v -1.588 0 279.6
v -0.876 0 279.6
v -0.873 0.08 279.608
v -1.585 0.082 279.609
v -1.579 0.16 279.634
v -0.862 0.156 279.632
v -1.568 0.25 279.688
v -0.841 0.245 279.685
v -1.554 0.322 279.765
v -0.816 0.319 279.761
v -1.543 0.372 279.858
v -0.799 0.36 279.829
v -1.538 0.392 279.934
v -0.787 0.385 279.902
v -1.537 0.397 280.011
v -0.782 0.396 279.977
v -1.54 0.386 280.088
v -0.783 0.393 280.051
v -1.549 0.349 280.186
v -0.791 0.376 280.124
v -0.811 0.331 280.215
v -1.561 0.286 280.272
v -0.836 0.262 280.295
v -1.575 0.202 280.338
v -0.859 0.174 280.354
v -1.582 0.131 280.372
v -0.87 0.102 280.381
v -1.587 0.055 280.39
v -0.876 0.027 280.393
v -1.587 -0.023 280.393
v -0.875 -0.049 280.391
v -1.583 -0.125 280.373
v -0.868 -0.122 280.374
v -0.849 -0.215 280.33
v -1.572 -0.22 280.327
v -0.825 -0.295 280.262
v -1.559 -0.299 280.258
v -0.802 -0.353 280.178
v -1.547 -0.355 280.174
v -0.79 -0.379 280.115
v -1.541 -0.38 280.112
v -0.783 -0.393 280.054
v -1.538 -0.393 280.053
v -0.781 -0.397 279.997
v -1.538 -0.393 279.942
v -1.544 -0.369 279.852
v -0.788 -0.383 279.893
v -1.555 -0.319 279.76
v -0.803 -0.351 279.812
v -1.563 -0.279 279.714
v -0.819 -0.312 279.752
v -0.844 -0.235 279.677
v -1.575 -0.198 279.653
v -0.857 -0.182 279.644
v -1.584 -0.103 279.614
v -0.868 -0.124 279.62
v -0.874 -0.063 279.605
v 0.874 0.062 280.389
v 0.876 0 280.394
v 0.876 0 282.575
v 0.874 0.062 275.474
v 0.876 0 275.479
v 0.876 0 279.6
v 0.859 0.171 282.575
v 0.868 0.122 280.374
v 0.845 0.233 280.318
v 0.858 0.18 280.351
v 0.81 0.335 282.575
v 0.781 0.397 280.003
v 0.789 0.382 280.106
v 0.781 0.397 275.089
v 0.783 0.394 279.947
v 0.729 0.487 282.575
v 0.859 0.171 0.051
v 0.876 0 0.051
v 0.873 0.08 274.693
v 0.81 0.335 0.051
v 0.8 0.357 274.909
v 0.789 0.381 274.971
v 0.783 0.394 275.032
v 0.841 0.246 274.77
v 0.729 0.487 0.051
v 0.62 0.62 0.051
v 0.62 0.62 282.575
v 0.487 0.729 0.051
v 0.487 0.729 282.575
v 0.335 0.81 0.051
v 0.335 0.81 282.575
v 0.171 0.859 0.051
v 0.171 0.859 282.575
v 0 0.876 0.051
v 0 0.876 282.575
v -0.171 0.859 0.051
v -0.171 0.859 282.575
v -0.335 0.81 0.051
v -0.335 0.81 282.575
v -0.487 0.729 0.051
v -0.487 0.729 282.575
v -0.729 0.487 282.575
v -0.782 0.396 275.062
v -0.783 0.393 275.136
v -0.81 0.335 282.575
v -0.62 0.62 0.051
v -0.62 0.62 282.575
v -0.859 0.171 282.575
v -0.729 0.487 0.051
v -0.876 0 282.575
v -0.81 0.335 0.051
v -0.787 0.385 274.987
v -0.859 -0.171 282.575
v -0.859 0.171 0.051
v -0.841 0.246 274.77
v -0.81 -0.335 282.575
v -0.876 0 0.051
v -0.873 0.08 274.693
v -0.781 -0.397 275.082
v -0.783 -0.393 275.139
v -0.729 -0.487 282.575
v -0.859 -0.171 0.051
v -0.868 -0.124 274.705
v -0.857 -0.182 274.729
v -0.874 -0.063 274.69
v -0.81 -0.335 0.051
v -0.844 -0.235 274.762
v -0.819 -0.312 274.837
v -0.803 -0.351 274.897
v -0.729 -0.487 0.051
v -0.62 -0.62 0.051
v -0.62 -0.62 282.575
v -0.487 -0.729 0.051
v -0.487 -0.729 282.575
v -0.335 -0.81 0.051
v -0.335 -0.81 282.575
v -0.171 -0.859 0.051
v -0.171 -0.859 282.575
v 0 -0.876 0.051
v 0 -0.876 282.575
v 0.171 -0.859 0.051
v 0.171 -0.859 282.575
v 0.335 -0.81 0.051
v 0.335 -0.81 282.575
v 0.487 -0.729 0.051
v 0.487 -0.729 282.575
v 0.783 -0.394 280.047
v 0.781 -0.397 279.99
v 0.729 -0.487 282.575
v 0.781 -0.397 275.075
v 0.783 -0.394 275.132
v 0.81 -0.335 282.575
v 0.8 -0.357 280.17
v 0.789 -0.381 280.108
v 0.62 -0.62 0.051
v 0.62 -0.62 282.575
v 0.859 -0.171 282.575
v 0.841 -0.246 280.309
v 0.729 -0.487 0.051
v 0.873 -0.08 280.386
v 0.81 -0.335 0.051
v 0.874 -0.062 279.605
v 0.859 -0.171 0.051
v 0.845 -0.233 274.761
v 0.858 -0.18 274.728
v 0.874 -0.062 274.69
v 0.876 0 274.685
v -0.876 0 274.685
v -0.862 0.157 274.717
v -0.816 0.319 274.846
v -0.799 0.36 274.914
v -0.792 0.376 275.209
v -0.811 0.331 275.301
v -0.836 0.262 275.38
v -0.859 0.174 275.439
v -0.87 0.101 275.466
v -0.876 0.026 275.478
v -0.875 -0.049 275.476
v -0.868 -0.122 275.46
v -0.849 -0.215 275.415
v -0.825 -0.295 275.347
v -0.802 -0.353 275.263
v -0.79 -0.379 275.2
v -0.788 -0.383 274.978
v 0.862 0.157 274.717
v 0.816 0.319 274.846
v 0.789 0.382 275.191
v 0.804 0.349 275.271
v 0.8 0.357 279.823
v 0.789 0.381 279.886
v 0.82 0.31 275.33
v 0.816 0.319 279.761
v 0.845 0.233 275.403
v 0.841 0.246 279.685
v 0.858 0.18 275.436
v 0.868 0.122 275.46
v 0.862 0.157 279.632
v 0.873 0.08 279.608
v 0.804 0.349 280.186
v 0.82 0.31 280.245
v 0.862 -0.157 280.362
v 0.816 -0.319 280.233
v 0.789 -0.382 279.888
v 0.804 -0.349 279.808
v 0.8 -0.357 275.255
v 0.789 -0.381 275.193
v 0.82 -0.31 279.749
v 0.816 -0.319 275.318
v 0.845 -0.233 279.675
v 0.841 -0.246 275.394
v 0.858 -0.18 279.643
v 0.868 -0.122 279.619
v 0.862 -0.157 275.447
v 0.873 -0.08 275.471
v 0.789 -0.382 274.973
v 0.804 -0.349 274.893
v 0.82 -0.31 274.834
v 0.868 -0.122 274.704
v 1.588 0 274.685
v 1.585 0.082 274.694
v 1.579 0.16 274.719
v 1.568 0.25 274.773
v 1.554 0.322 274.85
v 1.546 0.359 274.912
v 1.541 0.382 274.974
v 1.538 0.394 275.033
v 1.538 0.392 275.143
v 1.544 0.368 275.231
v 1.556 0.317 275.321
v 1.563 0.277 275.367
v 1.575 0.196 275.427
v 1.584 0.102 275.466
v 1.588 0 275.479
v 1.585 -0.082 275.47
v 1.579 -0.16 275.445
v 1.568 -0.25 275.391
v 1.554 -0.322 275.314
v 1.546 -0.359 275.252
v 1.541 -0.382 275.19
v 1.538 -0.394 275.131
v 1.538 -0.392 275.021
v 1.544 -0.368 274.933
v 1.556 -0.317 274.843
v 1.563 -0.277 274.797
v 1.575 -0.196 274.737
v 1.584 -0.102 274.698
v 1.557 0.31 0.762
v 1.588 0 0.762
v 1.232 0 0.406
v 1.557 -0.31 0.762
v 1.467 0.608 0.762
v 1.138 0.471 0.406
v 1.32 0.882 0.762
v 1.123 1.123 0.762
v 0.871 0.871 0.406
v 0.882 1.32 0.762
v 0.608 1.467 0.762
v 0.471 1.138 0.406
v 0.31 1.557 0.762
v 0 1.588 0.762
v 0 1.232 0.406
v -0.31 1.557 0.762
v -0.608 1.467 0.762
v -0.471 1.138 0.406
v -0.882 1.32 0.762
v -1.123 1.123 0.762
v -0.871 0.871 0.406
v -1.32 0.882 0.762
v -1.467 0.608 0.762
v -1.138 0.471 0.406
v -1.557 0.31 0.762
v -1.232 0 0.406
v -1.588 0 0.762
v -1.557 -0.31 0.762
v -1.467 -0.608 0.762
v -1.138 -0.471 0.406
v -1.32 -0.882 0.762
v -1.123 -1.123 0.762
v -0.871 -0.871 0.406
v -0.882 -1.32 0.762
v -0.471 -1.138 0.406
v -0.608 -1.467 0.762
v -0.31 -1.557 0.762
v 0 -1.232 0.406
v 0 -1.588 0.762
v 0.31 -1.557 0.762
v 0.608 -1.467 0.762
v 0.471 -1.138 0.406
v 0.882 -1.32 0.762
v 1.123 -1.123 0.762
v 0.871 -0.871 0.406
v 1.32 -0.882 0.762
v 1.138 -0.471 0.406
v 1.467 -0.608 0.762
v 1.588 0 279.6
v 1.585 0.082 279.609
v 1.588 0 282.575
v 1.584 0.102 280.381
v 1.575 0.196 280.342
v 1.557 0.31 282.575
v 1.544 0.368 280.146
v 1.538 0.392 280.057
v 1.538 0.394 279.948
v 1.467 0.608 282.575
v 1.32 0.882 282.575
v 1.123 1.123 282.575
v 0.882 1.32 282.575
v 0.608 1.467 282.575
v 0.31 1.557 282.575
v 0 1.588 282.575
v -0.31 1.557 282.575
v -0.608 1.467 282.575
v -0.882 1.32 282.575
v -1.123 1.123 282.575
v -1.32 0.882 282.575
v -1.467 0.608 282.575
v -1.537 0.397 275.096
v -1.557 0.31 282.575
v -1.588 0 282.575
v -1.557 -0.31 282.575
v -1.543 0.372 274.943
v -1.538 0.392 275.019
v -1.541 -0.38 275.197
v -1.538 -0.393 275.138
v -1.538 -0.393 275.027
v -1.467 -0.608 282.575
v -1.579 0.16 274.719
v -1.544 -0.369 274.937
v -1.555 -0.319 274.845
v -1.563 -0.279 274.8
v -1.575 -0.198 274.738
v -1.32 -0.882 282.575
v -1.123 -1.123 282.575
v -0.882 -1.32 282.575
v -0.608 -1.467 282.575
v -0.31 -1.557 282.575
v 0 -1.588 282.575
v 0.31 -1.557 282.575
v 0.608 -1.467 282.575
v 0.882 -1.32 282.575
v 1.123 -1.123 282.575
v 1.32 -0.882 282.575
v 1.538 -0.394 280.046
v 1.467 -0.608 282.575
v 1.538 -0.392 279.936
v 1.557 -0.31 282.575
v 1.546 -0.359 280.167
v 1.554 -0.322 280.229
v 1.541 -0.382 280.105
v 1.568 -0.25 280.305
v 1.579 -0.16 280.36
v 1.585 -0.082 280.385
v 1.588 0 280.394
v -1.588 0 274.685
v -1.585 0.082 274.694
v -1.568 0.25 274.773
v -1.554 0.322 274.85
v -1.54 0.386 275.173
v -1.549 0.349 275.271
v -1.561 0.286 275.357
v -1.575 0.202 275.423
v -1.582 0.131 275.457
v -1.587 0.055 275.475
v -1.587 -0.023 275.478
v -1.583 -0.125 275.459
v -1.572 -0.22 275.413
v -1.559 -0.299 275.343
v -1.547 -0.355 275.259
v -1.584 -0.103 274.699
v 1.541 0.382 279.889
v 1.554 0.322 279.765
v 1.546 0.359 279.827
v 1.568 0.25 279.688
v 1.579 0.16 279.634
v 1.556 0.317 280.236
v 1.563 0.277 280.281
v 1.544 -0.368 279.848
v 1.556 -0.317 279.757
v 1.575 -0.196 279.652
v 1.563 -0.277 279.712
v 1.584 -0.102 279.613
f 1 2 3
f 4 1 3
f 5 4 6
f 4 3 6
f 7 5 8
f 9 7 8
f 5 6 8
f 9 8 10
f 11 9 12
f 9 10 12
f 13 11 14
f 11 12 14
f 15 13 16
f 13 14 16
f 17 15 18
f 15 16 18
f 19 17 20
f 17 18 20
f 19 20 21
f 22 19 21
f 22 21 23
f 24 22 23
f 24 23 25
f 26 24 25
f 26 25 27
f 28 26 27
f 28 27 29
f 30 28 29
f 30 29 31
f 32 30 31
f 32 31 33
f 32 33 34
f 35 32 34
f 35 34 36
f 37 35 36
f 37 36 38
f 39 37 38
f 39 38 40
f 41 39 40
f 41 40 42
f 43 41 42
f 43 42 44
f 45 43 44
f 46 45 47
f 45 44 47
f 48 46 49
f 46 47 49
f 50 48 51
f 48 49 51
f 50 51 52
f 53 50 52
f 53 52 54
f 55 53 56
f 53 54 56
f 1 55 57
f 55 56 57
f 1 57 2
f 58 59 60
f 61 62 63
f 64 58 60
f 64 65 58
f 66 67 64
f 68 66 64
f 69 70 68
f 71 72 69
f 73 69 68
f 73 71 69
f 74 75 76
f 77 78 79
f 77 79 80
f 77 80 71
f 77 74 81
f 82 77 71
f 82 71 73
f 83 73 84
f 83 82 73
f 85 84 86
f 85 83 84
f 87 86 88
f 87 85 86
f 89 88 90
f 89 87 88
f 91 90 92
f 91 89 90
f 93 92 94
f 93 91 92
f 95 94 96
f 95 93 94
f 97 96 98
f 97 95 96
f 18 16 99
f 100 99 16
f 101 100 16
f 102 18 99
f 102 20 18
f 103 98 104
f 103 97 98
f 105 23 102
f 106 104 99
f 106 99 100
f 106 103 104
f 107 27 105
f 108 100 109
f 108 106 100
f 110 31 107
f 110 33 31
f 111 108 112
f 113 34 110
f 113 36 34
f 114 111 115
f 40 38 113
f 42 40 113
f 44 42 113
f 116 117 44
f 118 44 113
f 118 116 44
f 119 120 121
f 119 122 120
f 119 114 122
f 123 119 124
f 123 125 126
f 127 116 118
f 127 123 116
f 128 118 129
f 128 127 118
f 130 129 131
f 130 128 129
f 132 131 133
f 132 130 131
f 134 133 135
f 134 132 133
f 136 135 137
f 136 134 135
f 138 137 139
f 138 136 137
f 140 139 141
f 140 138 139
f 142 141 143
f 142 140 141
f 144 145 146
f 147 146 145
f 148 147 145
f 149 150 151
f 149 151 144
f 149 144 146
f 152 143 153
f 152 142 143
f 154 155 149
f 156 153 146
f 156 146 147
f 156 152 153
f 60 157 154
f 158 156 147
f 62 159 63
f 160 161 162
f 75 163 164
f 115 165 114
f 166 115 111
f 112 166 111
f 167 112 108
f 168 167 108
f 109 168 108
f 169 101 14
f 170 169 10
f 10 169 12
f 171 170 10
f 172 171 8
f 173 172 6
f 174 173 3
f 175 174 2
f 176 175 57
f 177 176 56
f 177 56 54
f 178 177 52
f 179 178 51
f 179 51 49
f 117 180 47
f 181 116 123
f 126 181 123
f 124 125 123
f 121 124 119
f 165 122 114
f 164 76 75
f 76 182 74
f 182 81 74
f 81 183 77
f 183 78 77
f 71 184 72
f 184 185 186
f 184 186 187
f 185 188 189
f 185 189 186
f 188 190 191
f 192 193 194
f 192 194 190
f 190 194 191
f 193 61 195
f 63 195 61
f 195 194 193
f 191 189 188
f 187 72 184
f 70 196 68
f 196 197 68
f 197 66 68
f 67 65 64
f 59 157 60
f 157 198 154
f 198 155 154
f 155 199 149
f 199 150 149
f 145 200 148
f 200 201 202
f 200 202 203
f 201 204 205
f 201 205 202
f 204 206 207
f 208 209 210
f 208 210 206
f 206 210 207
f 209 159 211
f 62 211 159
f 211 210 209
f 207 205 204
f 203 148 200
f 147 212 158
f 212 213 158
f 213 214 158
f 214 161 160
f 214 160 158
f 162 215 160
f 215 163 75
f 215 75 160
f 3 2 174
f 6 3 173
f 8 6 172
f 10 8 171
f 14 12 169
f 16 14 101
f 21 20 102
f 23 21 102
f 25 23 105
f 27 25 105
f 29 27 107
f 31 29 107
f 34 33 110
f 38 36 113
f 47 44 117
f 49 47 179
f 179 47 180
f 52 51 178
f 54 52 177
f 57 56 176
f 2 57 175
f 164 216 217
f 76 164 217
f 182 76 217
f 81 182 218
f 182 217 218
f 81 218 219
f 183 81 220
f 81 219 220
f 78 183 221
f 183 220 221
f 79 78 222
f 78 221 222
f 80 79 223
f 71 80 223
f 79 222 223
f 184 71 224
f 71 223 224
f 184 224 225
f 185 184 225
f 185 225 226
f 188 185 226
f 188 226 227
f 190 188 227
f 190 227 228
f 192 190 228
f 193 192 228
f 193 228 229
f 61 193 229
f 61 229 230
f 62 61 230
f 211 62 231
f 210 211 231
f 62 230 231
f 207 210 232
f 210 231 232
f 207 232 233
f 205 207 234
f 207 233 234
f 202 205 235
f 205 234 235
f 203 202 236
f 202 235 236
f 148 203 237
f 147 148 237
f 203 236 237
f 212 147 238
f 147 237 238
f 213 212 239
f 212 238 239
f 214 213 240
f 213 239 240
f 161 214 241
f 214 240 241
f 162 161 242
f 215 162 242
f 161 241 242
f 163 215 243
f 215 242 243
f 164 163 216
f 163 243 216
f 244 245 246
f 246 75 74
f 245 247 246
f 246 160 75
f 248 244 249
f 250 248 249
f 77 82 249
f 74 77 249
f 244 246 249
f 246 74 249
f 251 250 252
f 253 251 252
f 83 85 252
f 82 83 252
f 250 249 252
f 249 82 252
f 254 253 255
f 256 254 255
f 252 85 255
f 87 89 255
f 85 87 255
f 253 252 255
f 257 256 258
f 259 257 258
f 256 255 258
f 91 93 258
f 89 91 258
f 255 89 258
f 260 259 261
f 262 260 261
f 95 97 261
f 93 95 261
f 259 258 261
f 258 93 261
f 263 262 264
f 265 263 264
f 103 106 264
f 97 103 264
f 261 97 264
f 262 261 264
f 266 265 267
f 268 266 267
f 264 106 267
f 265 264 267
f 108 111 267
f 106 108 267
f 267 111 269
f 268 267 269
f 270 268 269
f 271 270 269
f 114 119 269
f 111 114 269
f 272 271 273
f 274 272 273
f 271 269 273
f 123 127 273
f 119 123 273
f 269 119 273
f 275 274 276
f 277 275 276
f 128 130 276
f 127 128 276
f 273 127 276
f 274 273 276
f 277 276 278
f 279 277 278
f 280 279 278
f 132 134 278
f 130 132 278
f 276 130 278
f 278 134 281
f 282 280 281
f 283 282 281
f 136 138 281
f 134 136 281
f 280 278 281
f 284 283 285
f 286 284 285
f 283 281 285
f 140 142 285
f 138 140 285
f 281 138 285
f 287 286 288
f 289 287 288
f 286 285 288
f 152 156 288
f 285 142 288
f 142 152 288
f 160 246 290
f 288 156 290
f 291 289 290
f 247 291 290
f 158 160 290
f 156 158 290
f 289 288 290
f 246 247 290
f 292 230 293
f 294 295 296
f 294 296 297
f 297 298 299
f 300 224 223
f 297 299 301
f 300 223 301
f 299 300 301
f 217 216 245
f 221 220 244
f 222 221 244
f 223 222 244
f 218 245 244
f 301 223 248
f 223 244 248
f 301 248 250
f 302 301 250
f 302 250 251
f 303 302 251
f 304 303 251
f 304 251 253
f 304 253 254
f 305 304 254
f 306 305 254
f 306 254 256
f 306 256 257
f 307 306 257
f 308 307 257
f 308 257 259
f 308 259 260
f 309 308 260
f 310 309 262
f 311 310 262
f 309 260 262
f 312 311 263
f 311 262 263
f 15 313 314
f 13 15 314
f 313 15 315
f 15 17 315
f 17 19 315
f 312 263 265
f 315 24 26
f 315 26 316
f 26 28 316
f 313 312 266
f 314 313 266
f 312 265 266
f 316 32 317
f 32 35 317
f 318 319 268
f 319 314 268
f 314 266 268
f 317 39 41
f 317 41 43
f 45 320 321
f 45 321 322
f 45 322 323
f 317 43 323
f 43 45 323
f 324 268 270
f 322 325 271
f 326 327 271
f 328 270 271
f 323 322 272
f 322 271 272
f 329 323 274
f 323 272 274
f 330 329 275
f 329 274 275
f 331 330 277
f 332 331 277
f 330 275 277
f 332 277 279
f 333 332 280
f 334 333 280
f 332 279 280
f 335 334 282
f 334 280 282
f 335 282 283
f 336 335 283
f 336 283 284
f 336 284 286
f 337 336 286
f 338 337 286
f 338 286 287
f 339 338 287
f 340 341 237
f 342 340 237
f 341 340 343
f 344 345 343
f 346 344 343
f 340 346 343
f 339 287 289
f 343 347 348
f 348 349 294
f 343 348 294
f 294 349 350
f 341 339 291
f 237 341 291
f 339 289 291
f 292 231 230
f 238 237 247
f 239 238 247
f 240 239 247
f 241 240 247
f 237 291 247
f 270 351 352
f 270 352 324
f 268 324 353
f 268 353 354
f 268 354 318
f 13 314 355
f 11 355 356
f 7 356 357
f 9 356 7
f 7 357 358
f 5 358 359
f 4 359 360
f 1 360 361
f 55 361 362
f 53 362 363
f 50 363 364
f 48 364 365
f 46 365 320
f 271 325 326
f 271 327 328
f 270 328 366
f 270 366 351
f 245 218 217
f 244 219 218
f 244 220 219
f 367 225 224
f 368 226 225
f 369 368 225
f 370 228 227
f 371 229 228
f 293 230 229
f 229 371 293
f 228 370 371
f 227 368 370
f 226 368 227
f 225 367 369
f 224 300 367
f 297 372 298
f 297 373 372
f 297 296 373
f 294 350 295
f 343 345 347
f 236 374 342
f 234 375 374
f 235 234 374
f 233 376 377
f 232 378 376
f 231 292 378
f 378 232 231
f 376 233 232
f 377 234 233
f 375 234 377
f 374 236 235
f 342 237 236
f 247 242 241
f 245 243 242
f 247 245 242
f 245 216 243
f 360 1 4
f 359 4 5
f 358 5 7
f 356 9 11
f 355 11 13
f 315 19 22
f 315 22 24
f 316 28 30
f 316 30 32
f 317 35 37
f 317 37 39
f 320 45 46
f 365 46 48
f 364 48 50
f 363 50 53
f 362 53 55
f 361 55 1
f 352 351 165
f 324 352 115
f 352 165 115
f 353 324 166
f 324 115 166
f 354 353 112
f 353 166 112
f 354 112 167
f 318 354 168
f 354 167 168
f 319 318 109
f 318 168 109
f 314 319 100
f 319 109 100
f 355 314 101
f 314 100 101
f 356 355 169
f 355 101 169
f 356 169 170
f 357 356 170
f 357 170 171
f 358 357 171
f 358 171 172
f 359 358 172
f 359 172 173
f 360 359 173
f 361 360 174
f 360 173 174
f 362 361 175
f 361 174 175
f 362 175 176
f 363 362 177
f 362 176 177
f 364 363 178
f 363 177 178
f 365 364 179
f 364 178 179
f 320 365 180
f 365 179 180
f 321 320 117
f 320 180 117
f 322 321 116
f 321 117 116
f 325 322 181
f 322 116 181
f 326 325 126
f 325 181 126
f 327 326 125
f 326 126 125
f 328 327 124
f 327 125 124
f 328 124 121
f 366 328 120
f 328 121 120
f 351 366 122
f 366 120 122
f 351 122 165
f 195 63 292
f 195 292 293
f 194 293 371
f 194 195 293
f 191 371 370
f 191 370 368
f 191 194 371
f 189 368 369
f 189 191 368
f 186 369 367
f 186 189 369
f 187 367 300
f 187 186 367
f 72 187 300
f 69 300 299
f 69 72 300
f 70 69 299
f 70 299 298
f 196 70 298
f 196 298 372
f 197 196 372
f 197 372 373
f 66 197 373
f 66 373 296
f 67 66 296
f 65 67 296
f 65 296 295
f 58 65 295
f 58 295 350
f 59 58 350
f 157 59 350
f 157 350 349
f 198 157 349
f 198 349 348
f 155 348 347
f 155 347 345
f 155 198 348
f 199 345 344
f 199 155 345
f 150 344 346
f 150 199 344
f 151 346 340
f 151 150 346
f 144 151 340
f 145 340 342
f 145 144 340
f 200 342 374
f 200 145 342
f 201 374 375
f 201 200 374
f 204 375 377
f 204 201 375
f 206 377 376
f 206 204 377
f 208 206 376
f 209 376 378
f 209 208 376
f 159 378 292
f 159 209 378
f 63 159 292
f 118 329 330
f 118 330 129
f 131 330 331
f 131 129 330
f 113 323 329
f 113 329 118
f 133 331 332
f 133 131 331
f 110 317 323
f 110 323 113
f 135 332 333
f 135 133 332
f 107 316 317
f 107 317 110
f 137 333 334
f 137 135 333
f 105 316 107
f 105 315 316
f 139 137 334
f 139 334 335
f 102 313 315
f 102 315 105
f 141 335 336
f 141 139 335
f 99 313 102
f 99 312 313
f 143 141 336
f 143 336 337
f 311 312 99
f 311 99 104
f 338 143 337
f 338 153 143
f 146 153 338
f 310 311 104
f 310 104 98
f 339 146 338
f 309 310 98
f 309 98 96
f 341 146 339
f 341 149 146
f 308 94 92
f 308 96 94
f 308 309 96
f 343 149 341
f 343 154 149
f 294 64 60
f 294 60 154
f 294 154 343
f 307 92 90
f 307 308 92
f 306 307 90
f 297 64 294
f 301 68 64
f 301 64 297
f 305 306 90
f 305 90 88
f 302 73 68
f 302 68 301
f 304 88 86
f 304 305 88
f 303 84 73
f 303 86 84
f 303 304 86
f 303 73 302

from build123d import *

# Parameters (mm, degrees)
SKETCH1_R           = 1.5875
SKETCH1_R_2         = 0.8763
BOSS_EXTRUDE1_DEPTH = 282.575
SKETCH3_R           = 0.396875
CUT_EXTRUDE1_DEPTH  = 2.159
CHAMFER1_SIZE       = 0.762


with BuildPart() as part:
    # Sketch1 → Boss-Extrude1 (new body)
    with BuildSketch(Plane.XY):
        Circle(SKETCH1_R)
        Circle(SKETCH1_R_2, mode=Mode.SUBTRACT)
    extrude(amount=BOSS_EXTRUDE1_DEPTH)

    # Sketch3 → Cut-Extrude1 (cut, symmetric)
    with BuildSketch(Plane(origin=(0, 0, 0), x_dir=(0, 0, -1), z_dir=(1, 0, 0))):
        with Locations((-279.9969, 0)):
            Circle(SKETCH3_R)
        with Locations((-275.082, 0)):
            Circle(SKETCH3_R)
    extrude(amount=CUT_EXTRUDE1_DEPTH, both=True, mode=Mode.SUBTRACT)

    # Chamfer1
    # the kernel refuses this chamfer: 0.762 mm, written as the material it takes off along each edge
    with BuildSketch(Plane(origin=(0, 0, 0), x_dir=(1, 0, 0), z_dir=(0, -1, 0))) as chamfer1_piece_1:
        Polygon((1.5875, CHAMFER1_SIZE), (1.5875 - CHAMFER1_SIZE, 0), (1.5875, 0), align=None)
    revolve(axis=Axis((0, 0, 0), (0, 0, 1)), mode=Mode.SUBTRACT)


solid = part.part
